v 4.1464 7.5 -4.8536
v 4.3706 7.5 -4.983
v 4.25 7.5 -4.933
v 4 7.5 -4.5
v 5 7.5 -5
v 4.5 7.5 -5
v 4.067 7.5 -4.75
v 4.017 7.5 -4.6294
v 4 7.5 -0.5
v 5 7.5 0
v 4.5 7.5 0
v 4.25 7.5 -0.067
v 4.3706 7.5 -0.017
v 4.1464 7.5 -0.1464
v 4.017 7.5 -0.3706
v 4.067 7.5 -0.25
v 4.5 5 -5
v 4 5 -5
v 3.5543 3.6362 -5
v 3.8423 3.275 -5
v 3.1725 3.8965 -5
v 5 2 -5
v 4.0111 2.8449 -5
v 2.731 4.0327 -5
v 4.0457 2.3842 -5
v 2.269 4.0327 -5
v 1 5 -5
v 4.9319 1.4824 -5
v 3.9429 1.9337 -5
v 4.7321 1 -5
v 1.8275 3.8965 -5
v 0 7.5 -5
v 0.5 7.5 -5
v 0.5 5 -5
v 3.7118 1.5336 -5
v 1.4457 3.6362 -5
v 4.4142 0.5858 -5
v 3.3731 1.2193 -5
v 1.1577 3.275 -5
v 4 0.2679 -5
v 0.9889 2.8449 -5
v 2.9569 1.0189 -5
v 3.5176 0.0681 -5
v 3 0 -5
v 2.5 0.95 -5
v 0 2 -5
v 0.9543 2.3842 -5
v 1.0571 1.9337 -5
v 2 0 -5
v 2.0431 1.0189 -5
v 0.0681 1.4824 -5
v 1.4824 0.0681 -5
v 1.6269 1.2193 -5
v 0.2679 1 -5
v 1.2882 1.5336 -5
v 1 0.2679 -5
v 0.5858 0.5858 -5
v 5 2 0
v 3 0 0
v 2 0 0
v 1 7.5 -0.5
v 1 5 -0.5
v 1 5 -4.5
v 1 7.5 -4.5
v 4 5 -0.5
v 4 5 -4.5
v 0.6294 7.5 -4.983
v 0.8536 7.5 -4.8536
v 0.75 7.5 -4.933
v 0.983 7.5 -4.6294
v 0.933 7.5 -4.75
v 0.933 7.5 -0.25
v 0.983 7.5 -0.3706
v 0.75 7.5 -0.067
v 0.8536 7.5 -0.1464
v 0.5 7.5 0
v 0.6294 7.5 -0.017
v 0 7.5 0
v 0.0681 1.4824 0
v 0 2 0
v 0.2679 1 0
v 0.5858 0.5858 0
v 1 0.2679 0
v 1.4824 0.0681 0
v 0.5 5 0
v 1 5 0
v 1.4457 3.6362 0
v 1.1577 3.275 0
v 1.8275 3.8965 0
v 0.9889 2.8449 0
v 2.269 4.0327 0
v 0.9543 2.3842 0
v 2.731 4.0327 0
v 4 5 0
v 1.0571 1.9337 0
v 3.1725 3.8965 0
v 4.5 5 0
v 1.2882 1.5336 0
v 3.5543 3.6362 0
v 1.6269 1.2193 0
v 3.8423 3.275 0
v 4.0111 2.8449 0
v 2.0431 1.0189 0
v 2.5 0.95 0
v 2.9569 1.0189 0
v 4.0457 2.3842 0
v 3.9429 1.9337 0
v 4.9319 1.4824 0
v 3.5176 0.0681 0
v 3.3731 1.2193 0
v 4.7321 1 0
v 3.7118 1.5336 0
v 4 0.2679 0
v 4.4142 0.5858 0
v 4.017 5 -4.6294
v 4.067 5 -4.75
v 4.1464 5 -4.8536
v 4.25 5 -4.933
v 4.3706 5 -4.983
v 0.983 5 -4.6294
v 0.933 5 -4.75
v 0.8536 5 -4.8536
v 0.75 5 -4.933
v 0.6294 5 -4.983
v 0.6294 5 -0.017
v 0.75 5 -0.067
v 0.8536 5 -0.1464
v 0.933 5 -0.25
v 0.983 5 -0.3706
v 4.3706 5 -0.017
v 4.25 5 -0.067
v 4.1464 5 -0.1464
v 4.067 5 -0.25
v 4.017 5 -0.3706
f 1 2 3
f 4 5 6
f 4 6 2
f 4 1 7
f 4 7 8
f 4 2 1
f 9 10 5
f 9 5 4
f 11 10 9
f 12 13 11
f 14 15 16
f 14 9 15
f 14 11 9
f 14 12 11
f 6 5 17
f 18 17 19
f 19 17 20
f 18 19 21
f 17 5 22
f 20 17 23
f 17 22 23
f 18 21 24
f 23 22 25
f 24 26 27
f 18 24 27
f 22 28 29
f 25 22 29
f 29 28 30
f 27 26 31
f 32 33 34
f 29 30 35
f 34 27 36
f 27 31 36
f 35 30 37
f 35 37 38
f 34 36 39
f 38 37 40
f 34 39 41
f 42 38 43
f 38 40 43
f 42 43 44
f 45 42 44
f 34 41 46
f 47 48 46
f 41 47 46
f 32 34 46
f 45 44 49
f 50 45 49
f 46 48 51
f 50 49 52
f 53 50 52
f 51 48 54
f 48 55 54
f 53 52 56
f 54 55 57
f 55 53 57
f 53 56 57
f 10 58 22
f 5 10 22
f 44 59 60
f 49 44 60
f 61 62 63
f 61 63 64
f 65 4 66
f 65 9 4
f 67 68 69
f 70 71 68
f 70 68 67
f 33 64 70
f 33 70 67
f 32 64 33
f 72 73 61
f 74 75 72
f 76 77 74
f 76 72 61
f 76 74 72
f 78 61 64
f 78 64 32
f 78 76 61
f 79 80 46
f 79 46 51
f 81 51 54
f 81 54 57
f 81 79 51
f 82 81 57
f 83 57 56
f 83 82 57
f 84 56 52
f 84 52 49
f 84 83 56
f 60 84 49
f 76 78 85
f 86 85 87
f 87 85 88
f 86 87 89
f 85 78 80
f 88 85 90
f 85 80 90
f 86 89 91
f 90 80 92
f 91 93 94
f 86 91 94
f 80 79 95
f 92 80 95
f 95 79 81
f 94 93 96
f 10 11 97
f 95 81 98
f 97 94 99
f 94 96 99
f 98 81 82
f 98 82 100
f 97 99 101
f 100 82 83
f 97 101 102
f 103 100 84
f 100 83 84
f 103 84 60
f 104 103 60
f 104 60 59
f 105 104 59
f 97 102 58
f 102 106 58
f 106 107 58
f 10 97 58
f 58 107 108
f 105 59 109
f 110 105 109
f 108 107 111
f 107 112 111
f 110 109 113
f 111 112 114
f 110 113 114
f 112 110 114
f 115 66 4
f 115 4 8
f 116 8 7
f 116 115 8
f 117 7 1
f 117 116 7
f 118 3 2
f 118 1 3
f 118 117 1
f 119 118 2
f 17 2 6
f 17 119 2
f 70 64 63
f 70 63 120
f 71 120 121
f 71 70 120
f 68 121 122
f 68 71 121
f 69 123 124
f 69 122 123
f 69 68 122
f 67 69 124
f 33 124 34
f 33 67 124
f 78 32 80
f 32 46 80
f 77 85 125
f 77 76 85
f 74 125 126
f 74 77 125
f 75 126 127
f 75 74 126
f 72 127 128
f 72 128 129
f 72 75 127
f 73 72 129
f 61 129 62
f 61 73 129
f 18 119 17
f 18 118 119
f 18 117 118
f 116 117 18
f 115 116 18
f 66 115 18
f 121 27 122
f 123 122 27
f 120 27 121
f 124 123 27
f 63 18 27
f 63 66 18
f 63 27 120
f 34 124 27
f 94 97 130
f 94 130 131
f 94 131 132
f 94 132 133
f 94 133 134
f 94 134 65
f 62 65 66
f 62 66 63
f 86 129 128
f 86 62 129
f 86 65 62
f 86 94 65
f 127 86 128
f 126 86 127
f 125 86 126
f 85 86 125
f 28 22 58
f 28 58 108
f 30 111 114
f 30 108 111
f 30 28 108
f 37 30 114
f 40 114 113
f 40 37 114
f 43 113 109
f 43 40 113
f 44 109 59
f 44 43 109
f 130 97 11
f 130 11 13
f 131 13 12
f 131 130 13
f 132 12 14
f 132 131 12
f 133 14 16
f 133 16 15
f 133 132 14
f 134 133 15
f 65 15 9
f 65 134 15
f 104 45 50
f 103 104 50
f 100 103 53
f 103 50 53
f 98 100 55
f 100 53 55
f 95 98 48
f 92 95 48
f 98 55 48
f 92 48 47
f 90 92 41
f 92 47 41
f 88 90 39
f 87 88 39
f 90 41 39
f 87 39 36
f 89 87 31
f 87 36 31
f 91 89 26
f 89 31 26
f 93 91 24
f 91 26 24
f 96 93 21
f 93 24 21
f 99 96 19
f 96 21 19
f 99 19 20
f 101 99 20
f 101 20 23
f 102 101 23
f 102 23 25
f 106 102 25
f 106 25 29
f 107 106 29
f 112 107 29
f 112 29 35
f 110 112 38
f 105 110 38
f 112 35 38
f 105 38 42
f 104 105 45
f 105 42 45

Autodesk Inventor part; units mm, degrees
ref_plane "YZ Plane" through (0, 0, 0) normal (1, 0, 0) x (0, 1, 0)
ref_plane "XZ Plane" through (0, 0, 0) normal (0, 1, 0) x (-1, 0, 0)
ref_plane "XY Plane" through (0, 0, 0) normal (0, 0, 1) x (1, 0, 0)
sketch "スケッチ1" plane through (0, 0, 0) normal (0, 1, 0) x (-1, 0, 0)
  line L0 (0, 0) -> (-5, 0)
  line L1 (-5, 0) -> (-5, -5)
  line L2 (-5, -5) -> (0, -5)
  line L3 (0, -5) -> (0, 0)
  dimension "d0" = 5
  dimension "d1" = 5
extrude "押し出し1" add sketch "スケッチ1" along normal blind 7.5
sketch "スケッチ2" plane through (0, 0, 0) normal (0, 0, 1) x (1, 0, 0)
  line L0 (0, 0) -> (5, 0) projected
  line L1 (0, 0) -> (0, 7.5) projected
  point P0 (2.5, 2.5)
  dimension "d11" = 2.5
  dimension "d12" = 2.5
hole "穴1" at (2.5, 2.5, 0) direction (0, 0, -1) diameter 3.1 end through all
sketch "スケッチ3" plane through (0, 0, 0) normal (0, 0, 1) x (1, 0, 0)
  line L0 (1, 7.5) -> (4, 7.5)
  line L1 (4, 7.5) -> (4, 5)
  line L2 (4, 5) -> (1, 5)
  line L3 (1, 5) -> (1, 7.5)
  line L4 (1, 7.5) -> (4, 5) construction
  line L5 (4, 7.5) -> (1, 5) construction
  line L6 (0, 0) -> (0, 7.5) projected
  line L7 (0, 7.5) -> (5, 7.5) projected
  point P0 (2.5, 6.25)
  dimension "d13" = 3
  dimension "d14" = 2.5
  dimension "d15" = 2.5
  dimension "d16" = 0
extrude "押し出し2" cut sketch "スケッチ3" against normal through all
fillet "フィレット1" radius 2 2 edges at (5, 0, -2.5) (0, 0, -2.5)
fillet "フィレット2" radius 0.5 4 edges at (1, 6.25, 0) (4, 6.25, 0) (1, 6.25, -5) (4, 6.25, -5)
equation "\"d12\" = 0.5 * d0"
equation "\"d15\" = 0.5 * d0"
properties part number "gomu_guide2.8"
